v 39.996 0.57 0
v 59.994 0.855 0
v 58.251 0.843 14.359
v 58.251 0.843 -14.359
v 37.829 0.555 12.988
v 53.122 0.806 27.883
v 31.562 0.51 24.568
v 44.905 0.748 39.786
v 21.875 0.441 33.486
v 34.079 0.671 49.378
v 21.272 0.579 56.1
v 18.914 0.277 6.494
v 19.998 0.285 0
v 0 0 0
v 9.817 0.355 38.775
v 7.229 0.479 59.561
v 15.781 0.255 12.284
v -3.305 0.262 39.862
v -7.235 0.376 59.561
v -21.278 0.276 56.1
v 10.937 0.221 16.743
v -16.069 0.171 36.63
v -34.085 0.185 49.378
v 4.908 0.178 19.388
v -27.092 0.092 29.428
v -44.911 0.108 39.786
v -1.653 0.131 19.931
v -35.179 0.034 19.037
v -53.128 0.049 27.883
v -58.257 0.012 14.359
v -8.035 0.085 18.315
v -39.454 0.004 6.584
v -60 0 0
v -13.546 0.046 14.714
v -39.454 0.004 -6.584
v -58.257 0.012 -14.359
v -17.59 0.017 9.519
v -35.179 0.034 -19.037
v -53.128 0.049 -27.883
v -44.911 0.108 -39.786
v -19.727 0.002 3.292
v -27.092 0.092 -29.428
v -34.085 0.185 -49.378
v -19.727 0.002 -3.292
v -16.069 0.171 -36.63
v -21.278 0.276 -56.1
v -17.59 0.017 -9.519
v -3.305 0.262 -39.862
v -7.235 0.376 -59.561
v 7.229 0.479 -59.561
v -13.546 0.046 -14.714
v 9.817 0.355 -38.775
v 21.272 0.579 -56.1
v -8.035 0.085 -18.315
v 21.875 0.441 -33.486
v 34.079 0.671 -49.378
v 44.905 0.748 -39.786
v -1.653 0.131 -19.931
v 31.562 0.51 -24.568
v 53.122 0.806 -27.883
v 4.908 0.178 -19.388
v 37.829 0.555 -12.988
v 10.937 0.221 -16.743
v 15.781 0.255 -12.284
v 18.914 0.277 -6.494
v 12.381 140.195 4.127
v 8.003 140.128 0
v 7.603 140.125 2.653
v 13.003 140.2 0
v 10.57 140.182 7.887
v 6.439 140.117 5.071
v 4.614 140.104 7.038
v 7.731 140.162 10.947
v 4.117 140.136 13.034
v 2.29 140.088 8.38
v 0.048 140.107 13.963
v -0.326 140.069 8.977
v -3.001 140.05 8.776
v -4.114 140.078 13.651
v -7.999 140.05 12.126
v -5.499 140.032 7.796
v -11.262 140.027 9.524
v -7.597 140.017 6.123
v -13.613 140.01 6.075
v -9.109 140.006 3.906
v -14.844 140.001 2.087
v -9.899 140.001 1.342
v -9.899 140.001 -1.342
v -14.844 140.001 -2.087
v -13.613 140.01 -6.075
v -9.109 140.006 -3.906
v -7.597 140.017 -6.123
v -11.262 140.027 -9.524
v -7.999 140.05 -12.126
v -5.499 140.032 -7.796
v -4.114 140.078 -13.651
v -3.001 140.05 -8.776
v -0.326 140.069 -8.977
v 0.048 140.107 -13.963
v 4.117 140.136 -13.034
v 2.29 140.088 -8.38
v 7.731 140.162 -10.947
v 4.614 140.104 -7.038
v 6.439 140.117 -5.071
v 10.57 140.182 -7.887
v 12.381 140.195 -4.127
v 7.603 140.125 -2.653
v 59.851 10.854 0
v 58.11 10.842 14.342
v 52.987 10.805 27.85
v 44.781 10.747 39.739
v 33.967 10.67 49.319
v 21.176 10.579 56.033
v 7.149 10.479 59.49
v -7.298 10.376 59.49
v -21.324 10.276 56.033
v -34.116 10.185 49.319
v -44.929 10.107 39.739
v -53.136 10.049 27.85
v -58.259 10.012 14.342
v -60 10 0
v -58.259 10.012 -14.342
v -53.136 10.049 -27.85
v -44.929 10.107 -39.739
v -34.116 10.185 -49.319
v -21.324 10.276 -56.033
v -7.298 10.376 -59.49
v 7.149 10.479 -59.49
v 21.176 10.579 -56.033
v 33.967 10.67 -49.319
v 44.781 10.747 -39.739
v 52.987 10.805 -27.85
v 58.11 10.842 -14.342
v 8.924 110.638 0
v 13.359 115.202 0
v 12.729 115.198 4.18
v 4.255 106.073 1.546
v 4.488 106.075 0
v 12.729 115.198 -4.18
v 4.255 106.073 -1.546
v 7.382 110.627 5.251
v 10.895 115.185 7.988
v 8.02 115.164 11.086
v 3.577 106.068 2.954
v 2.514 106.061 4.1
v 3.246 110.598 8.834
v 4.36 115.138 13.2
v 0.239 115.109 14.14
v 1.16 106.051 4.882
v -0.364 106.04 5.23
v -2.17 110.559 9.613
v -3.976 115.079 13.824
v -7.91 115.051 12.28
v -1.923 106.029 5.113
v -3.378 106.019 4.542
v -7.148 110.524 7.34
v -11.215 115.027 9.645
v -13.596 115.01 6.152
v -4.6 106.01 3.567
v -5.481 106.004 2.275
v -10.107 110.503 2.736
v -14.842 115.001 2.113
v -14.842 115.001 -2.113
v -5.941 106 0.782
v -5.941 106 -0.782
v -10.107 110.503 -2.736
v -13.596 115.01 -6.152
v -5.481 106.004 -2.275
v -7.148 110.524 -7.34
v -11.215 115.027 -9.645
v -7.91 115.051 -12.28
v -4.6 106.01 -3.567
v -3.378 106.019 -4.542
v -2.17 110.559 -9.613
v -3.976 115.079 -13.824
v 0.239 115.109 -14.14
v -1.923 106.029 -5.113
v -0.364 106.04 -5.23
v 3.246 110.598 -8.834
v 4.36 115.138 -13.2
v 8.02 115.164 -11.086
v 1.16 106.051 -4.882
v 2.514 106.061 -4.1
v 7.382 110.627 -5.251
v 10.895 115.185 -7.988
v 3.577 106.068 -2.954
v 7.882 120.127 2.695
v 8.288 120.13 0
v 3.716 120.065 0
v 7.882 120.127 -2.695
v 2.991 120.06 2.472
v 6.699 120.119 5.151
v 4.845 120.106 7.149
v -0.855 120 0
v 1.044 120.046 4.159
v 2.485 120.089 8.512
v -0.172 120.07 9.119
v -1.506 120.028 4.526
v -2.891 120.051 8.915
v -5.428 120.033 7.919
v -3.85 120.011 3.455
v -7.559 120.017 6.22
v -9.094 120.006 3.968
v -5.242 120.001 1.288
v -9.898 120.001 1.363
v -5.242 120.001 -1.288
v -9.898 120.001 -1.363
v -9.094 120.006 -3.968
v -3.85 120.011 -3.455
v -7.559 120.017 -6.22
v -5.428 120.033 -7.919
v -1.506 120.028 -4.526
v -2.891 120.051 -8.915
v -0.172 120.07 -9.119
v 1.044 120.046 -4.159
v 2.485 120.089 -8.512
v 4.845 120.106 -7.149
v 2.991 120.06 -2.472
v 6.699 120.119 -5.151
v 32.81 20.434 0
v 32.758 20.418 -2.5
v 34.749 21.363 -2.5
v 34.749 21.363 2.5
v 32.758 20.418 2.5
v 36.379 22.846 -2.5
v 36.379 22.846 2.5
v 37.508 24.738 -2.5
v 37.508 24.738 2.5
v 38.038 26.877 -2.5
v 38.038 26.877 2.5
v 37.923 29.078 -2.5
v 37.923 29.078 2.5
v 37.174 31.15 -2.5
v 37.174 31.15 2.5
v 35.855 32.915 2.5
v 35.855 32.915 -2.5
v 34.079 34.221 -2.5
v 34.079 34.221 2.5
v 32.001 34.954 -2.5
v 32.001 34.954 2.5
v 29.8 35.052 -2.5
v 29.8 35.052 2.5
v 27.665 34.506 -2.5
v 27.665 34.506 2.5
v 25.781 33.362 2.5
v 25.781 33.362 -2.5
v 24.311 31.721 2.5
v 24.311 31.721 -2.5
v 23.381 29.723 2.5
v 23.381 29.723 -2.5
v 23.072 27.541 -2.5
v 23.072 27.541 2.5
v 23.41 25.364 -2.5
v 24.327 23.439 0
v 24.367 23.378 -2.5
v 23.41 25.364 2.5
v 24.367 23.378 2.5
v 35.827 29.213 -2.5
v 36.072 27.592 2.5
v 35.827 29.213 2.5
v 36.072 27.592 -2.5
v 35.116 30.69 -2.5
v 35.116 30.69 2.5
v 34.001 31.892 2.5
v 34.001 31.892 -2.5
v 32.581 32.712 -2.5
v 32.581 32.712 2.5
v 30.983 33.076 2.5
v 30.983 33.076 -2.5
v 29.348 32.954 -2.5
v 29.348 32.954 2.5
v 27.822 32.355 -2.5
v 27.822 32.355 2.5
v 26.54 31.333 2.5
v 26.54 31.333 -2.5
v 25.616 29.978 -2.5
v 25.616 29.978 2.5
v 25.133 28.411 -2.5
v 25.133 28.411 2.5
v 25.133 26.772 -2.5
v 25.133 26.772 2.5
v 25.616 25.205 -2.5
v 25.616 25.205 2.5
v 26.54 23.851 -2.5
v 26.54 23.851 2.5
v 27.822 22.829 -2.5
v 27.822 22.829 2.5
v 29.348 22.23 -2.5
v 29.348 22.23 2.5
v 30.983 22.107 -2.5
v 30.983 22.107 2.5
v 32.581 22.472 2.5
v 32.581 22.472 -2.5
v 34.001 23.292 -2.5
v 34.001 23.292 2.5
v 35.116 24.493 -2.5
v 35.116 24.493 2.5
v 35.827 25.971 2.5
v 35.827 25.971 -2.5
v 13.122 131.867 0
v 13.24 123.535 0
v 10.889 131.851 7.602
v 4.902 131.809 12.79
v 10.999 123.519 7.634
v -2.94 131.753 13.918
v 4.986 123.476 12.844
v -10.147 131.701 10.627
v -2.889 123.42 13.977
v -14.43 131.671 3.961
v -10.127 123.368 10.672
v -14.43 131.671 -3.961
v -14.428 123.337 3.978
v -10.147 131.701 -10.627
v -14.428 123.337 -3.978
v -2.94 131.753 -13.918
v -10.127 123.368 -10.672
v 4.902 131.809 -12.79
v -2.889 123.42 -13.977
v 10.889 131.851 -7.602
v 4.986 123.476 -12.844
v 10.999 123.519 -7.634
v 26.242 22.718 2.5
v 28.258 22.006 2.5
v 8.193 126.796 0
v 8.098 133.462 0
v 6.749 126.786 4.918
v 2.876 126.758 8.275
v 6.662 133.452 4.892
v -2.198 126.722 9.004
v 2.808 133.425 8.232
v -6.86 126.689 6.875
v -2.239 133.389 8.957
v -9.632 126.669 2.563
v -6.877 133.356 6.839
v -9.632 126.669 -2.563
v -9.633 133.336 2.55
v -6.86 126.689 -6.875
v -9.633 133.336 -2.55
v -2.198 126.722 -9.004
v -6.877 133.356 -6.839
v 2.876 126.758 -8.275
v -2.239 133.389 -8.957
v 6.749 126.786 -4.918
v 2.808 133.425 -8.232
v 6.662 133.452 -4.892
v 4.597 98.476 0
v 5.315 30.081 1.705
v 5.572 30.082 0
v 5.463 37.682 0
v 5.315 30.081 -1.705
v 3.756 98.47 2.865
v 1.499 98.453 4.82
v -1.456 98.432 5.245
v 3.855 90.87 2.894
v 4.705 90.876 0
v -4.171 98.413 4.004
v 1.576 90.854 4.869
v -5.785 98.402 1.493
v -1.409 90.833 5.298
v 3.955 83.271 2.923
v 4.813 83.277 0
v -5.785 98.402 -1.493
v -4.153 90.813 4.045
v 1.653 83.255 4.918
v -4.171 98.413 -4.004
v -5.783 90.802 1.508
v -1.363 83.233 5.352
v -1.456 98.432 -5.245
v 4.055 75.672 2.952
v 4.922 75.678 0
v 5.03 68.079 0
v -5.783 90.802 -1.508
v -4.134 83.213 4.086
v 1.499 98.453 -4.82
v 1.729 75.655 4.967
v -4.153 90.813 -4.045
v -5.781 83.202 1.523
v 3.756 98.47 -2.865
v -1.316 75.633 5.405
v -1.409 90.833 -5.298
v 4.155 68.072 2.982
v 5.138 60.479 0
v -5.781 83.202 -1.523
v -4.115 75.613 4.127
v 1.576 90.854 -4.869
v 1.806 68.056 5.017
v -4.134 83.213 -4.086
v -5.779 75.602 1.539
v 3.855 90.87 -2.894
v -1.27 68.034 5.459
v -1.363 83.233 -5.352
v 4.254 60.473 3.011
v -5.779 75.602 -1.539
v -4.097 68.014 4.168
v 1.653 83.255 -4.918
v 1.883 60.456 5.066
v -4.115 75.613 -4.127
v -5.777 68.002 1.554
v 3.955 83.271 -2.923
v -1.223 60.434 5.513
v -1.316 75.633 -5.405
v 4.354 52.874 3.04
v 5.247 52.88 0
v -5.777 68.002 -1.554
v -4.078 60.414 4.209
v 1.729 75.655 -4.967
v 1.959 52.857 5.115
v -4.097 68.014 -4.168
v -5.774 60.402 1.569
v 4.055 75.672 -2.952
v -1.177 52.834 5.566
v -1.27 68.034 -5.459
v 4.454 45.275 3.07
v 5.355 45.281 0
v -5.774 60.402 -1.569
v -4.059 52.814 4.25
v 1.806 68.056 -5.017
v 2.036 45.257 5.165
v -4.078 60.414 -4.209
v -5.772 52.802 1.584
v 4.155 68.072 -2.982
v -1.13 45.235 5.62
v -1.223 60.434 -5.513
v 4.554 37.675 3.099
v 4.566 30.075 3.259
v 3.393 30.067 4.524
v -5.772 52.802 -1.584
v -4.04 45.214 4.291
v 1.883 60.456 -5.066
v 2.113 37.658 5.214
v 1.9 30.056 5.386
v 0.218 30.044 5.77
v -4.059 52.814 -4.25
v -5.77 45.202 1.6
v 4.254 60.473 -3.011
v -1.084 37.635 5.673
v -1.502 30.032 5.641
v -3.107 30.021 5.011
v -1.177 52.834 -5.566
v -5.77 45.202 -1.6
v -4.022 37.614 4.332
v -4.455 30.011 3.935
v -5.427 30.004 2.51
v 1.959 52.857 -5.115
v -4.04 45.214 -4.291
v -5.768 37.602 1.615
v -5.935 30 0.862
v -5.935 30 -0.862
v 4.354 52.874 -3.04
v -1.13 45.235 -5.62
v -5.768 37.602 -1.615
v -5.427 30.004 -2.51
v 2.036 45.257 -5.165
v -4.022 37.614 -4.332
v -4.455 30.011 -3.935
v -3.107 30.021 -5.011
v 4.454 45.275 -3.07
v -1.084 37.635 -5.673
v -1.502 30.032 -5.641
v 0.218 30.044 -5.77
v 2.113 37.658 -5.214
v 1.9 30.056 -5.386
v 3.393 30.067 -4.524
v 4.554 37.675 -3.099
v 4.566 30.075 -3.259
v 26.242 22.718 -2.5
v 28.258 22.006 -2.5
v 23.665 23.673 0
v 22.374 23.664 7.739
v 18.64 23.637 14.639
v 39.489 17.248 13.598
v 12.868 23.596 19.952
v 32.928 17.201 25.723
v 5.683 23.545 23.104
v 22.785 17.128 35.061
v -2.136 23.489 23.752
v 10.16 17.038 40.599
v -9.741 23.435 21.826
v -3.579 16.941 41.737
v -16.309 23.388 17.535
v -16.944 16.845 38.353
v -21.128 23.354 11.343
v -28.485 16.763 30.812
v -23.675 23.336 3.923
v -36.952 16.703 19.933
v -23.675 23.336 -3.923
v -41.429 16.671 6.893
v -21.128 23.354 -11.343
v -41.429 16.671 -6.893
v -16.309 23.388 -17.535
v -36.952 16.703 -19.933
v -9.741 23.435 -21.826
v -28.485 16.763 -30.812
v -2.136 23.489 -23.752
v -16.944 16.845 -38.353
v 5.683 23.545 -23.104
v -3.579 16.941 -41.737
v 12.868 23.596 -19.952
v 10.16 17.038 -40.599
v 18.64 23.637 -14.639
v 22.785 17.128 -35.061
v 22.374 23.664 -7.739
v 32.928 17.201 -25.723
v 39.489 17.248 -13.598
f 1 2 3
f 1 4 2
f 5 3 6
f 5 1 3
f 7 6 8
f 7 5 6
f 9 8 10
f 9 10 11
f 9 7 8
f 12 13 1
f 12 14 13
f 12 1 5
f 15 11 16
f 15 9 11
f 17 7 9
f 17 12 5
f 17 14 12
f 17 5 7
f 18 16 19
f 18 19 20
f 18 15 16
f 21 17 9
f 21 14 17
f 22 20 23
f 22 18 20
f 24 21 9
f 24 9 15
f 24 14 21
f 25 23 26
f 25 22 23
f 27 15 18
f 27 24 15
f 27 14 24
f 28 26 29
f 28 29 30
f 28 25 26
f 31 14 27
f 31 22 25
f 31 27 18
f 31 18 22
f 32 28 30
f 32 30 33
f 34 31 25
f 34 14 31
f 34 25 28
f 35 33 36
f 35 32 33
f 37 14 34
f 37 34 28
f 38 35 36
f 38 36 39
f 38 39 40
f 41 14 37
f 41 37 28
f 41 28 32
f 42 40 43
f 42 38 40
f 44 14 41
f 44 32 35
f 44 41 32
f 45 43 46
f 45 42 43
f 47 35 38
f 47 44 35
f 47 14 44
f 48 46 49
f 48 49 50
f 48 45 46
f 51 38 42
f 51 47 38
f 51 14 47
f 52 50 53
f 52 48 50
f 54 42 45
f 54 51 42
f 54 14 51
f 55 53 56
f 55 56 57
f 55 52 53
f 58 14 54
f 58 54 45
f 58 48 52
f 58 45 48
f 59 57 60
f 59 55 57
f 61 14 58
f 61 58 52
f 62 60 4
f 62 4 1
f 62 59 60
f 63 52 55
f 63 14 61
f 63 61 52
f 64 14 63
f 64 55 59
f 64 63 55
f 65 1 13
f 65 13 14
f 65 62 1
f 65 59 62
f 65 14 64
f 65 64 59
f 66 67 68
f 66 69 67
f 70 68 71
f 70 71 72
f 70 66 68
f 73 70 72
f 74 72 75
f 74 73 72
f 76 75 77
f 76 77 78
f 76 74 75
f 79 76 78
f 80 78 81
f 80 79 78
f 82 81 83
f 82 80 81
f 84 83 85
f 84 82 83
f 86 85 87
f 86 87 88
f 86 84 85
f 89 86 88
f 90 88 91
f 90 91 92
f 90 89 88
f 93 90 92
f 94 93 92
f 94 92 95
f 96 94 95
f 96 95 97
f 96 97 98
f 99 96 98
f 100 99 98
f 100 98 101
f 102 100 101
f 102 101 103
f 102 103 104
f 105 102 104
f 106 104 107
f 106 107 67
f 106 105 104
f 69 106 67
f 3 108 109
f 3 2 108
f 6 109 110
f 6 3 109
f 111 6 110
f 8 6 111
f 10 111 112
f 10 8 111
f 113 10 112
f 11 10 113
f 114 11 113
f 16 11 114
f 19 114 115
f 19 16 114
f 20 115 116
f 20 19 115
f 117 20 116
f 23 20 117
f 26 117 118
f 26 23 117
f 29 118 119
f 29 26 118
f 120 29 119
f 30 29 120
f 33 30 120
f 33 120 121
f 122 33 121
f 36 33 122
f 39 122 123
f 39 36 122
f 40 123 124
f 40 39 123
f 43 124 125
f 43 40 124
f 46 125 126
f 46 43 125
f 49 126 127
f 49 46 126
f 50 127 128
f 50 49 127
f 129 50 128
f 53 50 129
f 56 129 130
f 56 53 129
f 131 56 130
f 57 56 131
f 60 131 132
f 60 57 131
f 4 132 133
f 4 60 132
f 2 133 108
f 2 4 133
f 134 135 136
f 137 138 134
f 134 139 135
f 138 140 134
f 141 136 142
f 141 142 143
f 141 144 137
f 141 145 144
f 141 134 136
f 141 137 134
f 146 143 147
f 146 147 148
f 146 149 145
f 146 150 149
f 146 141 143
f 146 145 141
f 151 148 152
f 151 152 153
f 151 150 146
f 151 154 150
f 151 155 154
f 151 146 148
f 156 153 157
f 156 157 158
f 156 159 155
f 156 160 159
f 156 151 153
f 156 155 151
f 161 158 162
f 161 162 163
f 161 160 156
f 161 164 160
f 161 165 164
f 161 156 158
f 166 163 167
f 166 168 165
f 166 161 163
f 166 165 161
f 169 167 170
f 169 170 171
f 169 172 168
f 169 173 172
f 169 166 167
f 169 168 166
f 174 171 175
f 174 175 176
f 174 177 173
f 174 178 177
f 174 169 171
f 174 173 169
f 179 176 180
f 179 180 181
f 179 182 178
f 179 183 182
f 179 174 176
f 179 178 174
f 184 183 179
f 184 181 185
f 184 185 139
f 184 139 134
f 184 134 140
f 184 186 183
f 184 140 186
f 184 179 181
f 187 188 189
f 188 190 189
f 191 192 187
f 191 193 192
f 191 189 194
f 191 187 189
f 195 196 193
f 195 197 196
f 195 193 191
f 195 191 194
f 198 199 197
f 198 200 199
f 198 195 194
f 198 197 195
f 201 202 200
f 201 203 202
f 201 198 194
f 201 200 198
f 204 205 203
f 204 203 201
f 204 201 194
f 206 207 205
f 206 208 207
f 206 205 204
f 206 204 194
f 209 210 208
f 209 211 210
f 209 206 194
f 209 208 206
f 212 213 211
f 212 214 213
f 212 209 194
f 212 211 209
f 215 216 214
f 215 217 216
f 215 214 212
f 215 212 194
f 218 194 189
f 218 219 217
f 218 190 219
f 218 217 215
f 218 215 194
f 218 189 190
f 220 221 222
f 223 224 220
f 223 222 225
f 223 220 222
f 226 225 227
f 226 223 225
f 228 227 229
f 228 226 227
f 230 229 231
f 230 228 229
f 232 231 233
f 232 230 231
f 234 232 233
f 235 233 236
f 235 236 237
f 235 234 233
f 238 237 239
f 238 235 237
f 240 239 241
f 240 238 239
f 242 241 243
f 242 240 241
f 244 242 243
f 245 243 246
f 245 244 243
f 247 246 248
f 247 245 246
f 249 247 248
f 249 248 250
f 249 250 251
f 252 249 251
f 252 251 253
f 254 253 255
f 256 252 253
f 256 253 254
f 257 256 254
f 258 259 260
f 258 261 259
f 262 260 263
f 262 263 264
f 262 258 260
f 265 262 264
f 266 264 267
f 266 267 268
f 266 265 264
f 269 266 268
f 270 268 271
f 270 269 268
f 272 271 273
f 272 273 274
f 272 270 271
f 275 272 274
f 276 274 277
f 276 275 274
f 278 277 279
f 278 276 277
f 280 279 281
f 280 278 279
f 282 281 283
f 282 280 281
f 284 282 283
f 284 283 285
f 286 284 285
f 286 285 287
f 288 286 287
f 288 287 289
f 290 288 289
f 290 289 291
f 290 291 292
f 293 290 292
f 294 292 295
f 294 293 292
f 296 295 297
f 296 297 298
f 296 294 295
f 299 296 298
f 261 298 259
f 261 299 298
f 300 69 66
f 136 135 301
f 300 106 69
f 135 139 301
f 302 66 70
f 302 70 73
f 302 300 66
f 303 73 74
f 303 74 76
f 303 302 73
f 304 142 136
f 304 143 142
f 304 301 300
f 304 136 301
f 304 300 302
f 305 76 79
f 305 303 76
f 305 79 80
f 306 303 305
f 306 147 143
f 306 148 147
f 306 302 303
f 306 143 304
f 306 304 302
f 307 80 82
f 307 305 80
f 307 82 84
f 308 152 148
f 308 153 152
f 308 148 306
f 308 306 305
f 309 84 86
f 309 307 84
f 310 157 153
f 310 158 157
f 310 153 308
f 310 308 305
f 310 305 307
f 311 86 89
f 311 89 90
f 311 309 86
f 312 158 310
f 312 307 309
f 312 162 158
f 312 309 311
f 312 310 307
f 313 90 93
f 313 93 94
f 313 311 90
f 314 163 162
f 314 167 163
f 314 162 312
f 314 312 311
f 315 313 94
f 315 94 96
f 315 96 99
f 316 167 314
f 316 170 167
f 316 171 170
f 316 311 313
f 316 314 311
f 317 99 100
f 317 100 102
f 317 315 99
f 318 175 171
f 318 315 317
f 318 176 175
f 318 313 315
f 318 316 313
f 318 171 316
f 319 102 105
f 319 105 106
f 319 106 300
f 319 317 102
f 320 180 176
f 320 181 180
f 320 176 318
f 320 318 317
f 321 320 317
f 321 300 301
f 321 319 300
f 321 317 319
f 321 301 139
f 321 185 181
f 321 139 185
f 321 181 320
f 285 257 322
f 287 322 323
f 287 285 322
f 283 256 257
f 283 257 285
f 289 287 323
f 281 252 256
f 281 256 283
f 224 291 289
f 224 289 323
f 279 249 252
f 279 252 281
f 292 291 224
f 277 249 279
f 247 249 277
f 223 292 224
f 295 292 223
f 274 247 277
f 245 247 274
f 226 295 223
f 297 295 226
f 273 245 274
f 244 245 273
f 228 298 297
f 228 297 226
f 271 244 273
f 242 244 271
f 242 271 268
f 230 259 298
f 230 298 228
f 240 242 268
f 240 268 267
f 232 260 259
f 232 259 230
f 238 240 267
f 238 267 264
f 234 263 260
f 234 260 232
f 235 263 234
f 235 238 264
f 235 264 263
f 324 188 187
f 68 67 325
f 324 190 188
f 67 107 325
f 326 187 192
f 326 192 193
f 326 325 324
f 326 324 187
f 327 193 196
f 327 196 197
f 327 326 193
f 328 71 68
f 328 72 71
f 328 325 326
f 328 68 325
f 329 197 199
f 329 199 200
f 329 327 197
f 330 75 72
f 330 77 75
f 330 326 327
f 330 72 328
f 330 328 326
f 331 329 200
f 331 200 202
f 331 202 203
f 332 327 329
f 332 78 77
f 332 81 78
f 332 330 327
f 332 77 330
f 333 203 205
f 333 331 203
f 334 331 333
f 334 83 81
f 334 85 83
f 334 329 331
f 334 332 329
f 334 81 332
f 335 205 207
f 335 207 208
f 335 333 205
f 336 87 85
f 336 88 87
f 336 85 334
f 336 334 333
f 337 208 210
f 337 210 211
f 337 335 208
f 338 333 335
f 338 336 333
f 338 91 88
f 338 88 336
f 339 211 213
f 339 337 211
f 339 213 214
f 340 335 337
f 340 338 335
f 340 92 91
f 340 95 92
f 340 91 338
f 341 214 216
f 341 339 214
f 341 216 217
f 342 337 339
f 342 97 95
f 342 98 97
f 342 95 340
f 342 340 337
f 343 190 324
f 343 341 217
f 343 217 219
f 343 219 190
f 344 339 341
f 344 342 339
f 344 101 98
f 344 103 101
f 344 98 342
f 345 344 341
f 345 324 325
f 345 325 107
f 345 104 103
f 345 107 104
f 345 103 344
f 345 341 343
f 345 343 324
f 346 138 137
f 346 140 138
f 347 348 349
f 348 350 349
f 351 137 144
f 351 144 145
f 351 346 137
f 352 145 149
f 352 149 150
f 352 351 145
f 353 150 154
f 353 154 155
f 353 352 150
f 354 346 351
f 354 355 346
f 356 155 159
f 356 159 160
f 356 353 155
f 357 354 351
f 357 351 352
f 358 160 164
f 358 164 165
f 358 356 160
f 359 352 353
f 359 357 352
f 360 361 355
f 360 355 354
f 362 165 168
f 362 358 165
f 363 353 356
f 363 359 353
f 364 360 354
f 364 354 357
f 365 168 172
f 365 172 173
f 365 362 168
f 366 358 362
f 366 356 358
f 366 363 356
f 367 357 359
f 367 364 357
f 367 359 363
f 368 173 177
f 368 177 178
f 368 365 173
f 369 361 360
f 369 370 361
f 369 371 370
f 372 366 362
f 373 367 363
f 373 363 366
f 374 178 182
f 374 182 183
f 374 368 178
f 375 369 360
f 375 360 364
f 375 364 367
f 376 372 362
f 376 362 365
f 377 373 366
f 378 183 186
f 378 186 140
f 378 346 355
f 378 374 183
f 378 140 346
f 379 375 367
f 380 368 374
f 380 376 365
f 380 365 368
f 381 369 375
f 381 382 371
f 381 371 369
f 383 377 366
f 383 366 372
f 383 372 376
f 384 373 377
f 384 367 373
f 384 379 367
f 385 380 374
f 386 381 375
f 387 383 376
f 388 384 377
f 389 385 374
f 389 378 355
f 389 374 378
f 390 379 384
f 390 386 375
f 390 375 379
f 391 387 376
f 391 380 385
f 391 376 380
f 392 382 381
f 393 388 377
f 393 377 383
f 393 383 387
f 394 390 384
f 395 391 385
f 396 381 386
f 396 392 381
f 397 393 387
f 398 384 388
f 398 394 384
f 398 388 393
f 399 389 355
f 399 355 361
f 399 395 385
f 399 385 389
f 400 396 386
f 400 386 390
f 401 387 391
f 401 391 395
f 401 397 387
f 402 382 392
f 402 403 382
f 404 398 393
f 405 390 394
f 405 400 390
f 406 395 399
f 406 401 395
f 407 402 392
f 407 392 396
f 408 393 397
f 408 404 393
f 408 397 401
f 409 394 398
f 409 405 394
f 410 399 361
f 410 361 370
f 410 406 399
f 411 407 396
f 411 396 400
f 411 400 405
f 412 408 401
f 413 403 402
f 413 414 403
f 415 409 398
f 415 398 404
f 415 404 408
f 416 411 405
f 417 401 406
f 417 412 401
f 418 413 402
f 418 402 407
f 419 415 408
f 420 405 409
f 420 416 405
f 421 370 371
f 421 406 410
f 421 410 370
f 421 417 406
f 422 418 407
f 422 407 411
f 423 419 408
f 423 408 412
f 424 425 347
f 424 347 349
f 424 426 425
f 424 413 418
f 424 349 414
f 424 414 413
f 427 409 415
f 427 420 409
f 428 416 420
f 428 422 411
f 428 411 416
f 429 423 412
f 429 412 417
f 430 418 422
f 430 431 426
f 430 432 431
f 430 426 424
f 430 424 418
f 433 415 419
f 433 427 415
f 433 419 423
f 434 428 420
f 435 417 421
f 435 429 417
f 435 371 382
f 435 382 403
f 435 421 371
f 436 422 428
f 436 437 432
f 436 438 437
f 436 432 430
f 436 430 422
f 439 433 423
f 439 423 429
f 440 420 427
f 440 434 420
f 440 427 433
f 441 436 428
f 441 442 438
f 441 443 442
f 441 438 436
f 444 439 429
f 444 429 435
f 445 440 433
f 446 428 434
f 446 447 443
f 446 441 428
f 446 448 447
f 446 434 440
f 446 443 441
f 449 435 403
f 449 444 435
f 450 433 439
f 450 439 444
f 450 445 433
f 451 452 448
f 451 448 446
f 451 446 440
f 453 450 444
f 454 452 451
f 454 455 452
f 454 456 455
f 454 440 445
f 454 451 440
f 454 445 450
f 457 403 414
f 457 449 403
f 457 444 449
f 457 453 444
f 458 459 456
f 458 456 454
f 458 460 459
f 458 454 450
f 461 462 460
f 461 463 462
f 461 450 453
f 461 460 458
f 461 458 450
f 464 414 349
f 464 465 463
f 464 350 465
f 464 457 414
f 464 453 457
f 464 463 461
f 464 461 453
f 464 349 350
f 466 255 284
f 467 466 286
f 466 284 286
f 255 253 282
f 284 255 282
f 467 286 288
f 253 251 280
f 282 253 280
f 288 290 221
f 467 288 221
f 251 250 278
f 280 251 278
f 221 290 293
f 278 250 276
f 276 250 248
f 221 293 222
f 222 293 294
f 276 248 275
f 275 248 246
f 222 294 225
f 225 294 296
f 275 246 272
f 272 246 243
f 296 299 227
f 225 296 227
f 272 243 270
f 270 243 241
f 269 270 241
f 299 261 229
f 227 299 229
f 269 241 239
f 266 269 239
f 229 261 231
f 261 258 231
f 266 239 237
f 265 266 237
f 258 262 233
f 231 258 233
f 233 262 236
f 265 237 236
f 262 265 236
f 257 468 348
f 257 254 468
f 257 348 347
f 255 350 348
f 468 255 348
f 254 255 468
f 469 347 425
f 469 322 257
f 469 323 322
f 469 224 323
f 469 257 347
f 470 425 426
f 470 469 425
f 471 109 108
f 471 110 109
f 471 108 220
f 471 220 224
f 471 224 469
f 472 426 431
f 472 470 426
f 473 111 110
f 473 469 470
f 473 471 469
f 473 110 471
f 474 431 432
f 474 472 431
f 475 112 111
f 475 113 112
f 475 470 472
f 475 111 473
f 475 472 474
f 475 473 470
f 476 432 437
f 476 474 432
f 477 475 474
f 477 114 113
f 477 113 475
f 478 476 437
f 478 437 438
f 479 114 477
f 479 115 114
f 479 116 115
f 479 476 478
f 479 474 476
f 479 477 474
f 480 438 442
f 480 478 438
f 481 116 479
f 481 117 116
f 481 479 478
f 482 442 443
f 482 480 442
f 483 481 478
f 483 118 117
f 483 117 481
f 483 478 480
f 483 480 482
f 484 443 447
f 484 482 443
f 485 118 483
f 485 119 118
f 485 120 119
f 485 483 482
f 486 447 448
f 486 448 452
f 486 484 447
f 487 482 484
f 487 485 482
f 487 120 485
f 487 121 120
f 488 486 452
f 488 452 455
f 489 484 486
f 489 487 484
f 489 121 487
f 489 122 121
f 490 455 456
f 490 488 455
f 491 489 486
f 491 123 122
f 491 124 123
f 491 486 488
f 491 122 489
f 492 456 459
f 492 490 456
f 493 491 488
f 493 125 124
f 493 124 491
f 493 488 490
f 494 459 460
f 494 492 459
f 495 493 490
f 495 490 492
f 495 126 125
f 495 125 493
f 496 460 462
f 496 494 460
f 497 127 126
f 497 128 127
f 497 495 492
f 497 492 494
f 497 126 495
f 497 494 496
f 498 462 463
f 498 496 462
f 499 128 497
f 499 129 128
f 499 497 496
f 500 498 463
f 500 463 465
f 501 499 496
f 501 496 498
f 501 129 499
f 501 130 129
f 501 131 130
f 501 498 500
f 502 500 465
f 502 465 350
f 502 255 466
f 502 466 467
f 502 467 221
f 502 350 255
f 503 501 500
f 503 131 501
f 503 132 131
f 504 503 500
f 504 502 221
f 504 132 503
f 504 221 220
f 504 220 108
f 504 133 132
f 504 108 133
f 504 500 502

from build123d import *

# Parameters (mm, degrees)
SKETCH2_R           = 7.5
SKETCH2_R_2         = 5.5
BOSS_EXTRUDE1_DEPTH = 2.5


with BuildPart() as part:
    # Sketch1 → Revolve1 (revolve)
    with BuildSketch(Plane.XY, mode=Mode.PRIVATE) as revolve1_sk:
        Polygon((-0.855365474, 120), (-10, 120), (-10, 140), (-15, 140), (-15, 115), (-6, 106), (-6, 30), (-60, 10), (-60, 0), (0, 0), align=None)
    revolve(revolve1_sk.sketch.rotate(Axis((-0.855365474, 120, 0), (0.0071278645418364215, -0.9999745964508665, 0)), 180), axis=Axis((-0.855365474, 120, 0), (0.0071278645418364215, -0.9999745964508665, 0)))

    # Sketch2 → Boss-Extrude1 (add, symmetric)
    with BuildSketch(Plane.XY):
        with Locations((30.571729314, 27.591749237)):
            Circle(SKETCH2_R)
        with Locations((30.571729314, 27.591749237)):
            Circle(SKETCH2_R_2, mode=Mode.SUBTRACT)
    extrude(amount=BOSS_EXTRUDE1_DEPTH, both=True)


solid = part.part
